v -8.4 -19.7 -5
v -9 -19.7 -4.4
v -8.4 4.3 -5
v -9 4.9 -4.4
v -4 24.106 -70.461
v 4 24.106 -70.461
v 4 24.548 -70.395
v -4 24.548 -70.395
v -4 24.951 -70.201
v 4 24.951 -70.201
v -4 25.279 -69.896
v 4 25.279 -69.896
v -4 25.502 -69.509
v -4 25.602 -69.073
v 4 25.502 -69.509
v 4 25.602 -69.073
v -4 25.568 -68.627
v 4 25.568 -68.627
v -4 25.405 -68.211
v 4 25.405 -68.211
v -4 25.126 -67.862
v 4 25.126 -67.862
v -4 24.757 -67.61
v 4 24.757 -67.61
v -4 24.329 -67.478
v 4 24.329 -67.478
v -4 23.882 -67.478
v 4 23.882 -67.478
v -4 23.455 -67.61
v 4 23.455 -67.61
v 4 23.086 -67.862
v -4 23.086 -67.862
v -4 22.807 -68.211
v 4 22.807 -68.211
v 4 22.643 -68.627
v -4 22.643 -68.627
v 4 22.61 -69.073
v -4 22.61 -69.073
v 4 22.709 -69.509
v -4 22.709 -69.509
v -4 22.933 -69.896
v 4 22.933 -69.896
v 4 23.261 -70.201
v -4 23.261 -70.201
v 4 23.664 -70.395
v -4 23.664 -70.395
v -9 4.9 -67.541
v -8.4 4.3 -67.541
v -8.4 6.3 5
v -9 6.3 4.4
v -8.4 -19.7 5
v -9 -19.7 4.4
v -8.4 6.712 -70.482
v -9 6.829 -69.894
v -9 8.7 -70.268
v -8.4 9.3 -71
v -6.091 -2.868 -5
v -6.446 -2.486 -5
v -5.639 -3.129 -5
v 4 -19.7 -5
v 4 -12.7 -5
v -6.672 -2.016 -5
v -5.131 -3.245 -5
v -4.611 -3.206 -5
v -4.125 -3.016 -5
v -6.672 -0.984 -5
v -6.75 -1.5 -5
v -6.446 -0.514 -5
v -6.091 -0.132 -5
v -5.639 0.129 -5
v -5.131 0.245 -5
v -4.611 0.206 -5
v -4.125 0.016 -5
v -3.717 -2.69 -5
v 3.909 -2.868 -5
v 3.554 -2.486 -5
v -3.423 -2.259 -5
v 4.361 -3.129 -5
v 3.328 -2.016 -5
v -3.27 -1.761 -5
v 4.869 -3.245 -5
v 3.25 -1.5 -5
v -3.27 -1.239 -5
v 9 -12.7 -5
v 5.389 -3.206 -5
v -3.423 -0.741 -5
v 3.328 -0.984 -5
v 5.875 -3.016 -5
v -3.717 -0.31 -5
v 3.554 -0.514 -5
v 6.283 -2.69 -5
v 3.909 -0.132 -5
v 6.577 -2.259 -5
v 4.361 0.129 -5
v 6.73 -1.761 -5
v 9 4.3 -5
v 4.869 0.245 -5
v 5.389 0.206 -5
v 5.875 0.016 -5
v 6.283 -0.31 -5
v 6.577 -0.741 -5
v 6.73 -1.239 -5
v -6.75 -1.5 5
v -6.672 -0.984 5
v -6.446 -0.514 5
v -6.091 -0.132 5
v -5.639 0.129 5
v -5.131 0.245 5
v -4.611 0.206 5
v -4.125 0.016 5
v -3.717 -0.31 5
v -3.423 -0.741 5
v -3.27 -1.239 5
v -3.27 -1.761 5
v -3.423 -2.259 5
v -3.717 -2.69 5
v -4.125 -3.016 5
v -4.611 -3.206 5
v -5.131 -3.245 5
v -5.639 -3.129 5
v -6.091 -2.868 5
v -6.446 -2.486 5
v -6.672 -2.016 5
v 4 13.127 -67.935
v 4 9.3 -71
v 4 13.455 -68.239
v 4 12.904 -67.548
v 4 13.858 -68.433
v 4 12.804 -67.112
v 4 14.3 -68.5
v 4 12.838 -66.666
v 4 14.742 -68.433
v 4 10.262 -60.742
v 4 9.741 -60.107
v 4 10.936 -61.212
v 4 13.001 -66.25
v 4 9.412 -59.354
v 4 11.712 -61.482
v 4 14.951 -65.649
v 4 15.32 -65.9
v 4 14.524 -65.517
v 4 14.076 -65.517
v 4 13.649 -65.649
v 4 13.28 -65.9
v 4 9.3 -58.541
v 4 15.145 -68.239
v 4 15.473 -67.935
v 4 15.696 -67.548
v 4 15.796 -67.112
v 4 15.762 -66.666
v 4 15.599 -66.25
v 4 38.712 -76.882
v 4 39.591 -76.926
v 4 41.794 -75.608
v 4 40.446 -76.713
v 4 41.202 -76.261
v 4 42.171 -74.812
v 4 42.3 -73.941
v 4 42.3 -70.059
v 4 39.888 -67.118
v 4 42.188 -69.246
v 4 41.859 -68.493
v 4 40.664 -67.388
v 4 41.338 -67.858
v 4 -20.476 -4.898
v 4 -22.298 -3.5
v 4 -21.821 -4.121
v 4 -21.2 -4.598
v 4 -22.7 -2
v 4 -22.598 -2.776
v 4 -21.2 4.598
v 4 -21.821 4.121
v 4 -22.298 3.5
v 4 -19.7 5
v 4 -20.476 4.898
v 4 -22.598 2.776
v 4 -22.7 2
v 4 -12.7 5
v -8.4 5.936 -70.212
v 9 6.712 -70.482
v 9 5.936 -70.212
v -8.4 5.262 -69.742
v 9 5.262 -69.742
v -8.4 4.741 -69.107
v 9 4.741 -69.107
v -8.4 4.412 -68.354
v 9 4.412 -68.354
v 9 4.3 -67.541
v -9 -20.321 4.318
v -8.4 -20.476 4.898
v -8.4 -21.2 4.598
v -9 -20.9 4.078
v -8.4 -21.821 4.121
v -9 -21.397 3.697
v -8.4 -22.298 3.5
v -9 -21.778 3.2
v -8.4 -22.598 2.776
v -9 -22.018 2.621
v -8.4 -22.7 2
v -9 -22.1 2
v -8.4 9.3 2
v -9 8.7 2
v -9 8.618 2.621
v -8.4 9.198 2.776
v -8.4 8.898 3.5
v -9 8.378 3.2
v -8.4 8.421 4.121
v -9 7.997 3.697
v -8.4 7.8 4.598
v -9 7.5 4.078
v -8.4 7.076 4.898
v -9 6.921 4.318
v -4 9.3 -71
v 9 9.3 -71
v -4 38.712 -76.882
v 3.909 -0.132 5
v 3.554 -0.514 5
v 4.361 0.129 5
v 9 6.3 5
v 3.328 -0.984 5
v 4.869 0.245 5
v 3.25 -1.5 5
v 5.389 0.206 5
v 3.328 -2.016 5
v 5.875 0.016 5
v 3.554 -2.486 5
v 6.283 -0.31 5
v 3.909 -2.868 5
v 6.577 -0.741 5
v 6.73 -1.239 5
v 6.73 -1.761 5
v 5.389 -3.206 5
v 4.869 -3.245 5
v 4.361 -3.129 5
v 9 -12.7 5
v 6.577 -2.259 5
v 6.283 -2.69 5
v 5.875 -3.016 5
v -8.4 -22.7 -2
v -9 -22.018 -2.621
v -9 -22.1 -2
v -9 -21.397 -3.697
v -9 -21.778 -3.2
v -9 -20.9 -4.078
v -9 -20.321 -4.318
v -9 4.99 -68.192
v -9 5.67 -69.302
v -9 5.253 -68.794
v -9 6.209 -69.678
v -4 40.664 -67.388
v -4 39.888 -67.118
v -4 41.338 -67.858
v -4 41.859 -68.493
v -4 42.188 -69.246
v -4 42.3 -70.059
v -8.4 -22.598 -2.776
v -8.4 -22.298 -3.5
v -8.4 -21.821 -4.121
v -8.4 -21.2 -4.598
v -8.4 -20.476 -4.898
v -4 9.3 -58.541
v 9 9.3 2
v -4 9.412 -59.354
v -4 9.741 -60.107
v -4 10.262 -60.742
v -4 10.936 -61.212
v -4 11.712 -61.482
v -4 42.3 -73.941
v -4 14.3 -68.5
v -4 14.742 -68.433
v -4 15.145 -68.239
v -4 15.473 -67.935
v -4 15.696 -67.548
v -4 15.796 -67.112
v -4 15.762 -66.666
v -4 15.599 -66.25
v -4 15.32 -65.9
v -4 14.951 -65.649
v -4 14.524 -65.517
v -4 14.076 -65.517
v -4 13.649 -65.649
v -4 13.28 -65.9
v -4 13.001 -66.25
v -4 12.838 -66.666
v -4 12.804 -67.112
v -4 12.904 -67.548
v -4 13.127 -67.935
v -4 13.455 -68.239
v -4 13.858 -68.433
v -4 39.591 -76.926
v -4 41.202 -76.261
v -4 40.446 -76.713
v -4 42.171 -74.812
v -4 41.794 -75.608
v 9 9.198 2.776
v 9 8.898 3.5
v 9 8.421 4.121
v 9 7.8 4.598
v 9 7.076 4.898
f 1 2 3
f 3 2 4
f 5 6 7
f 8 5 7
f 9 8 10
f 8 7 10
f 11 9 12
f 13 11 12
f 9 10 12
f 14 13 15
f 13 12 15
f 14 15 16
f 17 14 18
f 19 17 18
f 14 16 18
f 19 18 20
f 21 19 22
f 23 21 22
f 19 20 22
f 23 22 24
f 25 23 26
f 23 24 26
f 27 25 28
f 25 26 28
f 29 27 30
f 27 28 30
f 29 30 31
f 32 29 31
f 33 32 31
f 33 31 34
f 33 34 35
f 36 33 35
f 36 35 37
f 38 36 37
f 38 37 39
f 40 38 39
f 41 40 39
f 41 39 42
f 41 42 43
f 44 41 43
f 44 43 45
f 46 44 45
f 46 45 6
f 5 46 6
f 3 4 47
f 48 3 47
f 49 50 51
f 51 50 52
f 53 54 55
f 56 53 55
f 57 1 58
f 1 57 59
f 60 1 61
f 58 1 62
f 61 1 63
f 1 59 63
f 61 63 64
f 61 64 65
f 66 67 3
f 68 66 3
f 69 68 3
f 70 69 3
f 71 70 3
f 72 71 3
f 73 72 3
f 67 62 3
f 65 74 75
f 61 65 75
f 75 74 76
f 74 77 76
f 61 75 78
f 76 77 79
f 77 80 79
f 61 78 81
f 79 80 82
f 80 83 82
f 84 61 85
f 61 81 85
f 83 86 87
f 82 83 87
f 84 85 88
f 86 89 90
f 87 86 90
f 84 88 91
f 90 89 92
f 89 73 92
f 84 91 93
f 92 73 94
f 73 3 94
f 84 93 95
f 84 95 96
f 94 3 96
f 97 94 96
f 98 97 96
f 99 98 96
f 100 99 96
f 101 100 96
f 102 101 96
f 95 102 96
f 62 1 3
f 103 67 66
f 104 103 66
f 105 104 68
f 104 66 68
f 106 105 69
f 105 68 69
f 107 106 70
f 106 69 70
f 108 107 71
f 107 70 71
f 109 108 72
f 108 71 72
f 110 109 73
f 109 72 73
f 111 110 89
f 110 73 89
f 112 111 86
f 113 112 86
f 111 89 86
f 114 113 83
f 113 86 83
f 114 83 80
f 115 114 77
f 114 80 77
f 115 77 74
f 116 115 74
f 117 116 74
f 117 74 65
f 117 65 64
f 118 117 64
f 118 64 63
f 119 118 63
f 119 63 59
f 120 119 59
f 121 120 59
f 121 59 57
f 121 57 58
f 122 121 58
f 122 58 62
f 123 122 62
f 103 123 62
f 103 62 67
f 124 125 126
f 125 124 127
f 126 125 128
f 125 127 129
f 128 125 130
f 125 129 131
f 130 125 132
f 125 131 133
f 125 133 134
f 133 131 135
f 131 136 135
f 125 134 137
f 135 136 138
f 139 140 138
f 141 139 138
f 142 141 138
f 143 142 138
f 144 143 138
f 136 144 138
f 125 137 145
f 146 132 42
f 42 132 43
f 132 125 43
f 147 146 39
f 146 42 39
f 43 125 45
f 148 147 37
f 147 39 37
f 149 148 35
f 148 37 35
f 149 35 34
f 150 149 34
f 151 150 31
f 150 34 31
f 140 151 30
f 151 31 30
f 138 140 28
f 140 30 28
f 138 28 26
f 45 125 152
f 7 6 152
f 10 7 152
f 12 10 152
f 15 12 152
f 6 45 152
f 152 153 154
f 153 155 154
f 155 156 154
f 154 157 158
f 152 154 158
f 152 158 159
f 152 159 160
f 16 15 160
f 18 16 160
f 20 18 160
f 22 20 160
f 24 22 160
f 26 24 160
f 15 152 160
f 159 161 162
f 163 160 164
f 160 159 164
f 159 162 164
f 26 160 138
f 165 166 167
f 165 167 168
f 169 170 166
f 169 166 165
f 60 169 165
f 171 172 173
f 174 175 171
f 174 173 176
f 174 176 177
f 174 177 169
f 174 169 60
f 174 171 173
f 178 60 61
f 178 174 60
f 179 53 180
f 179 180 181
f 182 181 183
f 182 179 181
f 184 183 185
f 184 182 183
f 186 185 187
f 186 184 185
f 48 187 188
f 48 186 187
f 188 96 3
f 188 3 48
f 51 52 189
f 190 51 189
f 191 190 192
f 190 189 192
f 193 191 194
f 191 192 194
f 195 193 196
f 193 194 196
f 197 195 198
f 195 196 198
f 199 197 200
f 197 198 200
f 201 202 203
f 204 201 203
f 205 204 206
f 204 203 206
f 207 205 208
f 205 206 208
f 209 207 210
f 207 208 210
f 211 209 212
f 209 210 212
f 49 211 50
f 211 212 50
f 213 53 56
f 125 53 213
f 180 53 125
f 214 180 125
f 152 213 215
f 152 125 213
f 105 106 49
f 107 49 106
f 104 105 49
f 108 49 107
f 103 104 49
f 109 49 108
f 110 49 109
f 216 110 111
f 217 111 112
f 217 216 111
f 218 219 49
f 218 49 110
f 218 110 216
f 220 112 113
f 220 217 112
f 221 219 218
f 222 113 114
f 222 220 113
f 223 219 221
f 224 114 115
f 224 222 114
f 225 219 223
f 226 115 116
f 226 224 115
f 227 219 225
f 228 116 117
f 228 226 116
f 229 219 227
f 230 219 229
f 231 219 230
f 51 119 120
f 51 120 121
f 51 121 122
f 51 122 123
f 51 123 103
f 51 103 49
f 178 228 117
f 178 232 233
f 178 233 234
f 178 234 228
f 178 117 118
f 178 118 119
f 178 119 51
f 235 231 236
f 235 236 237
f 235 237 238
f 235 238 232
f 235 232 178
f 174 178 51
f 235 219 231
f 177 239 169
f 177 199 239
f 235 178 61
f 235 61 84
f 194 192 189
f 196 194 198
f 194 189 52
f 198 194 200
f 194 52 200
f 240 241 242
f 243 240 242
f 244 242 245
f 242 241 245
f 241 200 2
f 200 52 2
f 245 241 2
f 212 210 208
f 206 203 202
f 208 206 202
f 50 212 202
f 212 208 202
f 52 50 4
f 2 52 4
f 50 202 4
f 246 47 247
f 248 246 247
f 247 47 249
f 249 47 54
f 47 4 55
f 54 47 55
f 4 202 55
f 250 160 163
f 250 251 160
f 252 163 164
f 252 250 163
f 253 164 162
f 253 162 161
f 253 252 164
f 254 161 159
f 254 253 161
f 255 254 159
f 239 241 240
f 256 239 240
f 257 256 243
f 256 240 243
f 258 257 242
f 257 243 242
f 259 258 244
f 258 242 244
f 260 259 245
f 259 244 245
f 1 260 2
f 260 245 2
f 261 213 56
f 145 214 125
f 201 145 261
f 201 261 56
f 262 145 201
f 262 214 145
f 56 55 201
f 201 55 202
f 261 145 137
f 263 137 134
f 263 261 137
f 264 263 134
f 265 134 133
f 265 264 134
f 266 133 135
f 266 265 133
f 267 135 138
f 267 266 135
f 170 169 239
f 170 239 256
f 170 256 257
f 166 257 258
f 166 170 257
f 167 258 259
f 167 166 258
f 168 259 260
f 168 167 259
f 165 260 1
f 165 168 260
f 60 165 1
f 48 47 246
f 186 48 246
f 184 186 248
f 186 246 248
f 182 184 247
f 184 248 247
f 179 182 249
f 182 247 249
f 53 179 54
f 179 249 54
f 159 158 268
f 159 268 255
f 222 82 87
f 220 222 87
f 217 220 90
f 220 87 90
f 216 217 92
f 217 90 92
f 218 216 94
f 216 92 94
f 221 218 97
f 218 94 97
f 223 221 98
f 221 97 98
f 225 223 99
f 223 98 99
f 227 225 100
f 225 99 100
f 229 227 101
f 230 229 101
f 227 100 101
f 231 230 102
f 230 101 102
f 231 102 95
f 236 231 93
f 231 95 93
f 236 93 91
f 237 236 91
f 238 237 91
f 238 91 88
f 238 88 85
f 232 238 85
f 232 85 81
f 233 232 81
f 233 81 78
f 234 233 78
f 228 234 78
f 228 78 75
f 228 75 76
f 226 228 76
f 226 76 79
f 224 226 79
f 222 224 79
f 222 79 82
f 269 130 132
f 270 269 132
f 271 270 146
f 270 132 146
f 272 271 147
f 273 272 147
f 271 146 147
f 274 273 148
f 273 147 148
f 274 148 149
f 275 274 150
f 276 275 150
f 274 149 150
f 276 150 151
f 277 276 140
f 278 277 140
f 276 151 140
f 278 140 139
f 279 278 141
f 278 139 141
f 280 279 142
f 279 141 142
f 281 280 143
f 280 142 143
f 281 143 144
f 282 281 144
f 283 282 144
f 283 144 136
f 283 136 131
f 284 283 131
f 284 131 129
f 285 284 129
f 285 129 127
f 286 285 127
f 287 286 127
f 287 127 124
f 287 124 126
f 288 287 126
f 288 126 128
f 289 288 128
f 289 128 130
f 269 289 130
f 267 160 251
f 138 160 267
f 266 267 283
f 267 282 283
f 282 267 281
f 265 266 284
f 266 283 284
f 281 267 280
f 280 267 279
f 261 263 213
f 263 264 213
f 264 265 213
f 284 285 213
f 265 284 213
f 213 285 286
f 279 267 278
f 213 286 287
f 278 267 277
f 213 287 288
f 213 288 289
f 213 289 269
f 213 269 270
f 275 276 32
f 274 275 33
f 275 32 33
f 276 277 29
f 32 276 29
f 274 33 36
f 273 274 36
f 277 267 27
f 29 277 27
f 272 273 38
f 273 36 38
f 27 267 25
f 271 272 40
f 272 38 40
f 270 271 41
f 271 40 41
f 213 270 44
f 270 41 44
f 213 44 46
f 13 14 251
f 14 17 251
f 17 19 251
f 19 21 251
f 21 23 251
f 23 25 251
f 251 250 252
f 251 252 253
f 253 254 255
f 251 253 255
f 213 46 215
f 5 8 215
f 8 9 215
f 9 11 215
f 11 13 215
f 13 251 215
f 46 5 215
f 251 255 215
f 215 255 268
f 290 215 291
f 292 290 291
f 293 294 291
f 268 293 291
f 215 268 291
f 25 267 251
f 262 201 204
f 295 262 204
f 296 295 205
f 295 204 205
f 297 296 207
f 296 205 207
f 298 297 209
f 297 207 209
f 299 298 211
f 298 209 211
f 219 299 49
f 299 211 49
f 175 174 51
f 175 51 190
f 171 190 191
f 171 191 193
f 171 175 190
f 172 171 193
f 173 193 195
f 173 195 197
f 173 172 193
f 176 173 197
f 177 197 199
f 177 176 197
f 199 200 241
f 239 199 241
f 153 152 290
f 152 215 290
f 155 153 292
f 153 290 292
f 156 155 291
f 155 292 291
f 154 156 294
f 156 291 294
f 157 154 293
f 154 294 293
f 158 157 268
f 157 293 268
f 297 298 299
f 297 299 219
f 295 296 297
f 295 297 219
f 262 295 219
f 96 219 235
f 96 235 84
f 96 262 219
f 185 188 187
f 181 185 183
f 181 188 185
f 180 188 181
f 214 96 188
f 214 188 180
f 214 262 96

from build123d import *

# Parameters (mm, degrees)
EXTRUDE_1_DEPTH     = 9
CUT_EXTRUDE_1_DEPTH = 5
SKETCH_3_R          = 1.75
CUT_EXTRUDE_2_DEPTH = 50.647599136312735
SKETCH_4_W          = 3.000000000000001
SKETCH_4_H          = 19.851507449534697
EXTRUDE_2_DEPTH     = 5.5
FILLET_2_R          = 5
FILLET_3_R          = 5
SKETCH_6_W          = 18
SKETCH_6_H          = 10.000000000000004
EXTRUDE_3_DEPTH     = 16.2
CUT_EXTRUDE_5_DEPTH = 52.567649463300064
CUT_EXTRUDE_6_DEPTH = 53.49411618001278
EXTRUDE_4_DEPTH     = 18
SKETCH_11_W         = 4.999999999999995
SKETCH_11_H         = 18.60004044786868
CUT_EXTRUDE_7_DEPTH = 33
SKETCH_12_R         = 1.4999999999999973
CUT_EXTRUDE_8_DEPTH = 90.33116605445798
FILLET_4_R          = 3
CHAMFER_3_SIZE      = 0.6


# Some blends are built 0.0001 mm under size
with BuildPart() as part:
    # ｽｹｯﾁ1 → ﾎﾞｽ - 押し出し1 (new, symmetric)
    with BuildSketch(Plane(origin=(0, 0, 0), x_dir=(0, 0, -1), z_dir=(1, 0, 0))):
        Polygon((-5.0000000000000036, -6.499999999999999), (5.0000000000000036, -6.499999999999999), (5.0000000000000036, 6.499999999999999), (13.25805060886326, 47.79), (3.2580506088632593, 47.79), (-5.0000000000000036, 6.500000000000001), align=None)
    extrude(amount=EXTRUDE_1_DEPTH, both=True)

    # ｽｹｯﾁ2 → ｶｯﾄ - 押し出し1 (cut)
    with BuildSketch(Plane(origin=(9, 0, 0), x_dir=(0, 0, -1), z_dir=(1, 0, 0))):
        Polygon((3.2580506088632593, 47.790000000000006), (-1.10677614066039, 25.966000000000005), (8.50860394182422, 24.04291219799919), (13.258050608863256, 47.790000000000006), align=None)
    cut_extrude_1 = extrude(amount=-CUT_EXTRUDE_1_DEPTH, mode=Mode.SUBTRACT)

    # ﾐﾗｰ1: ｶｯﾄ - 押し出し1 across plane
    add(cut_extrude_1.mirror(Plane(origin=(0, 0, 0), x_dir=(0, 0, 1), z_dir=(1, 0, 0))), mode=Mode.SUBTRACT)

    # ｽｹｯﾁ3 → ｶｯﾄ - 押し出し2 (cut, through all)
    with BuildSketch(Plane(origin=(0, 0, -5.0000000000000036), x_dir=(-1, 0, 0), z_dir=(0, 0, -1))):
        with Locations((5, -1.4999999999999987)):
            Circle(SKETCH_3_R)
        with Locations((-5, -1.4999999999999987)):
            Circle(SKETCH_3_R)
    extrude(amount=-CUT_EXTRUDE_2_DEPTH, mode=Mode.SUBTRACT)

    # ｽｹｯﾁ4 → ﾎﾞｽ - 押し出し2 (add)
    with BuildSketch(Plane(origin=(0, 1.2115468473854123, 6.057697112542844), x_dir=(1, 0, 0), z_dir=(0, 0.19611729080206414, 0.980580444557436))):
        with Locations((7.5, 15.318940160380402)):
            Rectangle(SKETCH_4_W, SKETCH_4_H)
        Polygon((-8.99999999999999, 5.393186435613051), (-8.999999999999993, 25.24469388514775), (-5.999999999999994, 25.244693885147754), (-5.9999999999999885, 5.393186435613052), align=None)
    extrude(amount=EXTRUDE_2_DEPTH)

    # ﾌｨﾚｯﾄ2
    # the kernel refuses this fillet: 5 mm, written as the material it takes off along each edge
    with BuildSketch(Plane(origin=(-19.247567109880233, 47.79, -13.25805060886326), x_dir=(0, -0.9805804445574373, 0.19611729080205748), z_dir=(1, 0, 0))) as fillet_2_piece_1:
        with BuildLine():
            CenterArc((FILLET_2_R * 1.21980536879, -FILLET_2_R), FILLET_2_R, 90.00000000000003, 101.30999999999938)
            Line((FILLET_2_R * 0.239224924233, -FILLET_2_R * 1.1961172908), (0, 0))
            Line((0, 0), (FILLET_2_R * 1.21980536879, 2e-17))
        make_face()
    extrude(amount=38.495134219760466, mode=Mode.SUBTRACT)
    with BuildSketch(Plane(origin=(14.247536467555662, 47.79, -3.2580506088632593), x_dir=(0, 0, -1), z_dir=(-1, 0, 0))) as fillet_2_piece_2:
        with BuildLine():
            CenterArc((FILLET_2_R * 0.819802917404, FILLET_2_R), FILLET_2_R, 191.30999999999946, 78.69000000000051)
            Line((-FILLET_2_R * 0.160777527153, FILLET_2_R * 0.803882709198), (0, 0))
            Line((0, 0), (FILLET_2_R * 0.819802917404, 0))
        make_face()
    extrude(amount=28.495072935111324, mode=Mode.SUBTRACT)

    # ﾌｨﾚｯﾄ3
    fillet_3_edges = [part.edges().sort_by_distance(p)[0] for p in [
        (-4, 25.004456098999597, -3.7009139005819147),
        (4, 25.004456098999597, -3.7009139005819147),
    ]]
    fillet(fillet_3_edges, radius=FILLET_3_R - 0.0001)  # a hair under: the kernel refuses the full size

    # 面取り2
    # the kernel refuses this chamfer: 1 mm, written as the material it takes off along each edge
    with BuildSketch(Plane(origin=(9, 23.43957972269821, -11.525247830932894), x_dir=(-0.9850292351397439, 0.16903968557305887, -0.0338081443053687), z_dir=(0, 0.19611729080206025, 0.9805804445574368))) as chamfer_2_piece_1:
        with BuildLine():
            Line((1.2305543745450382, 1e-17), (-0.4179125111005865, 1.157416606835036))
            Line((-0.4179125111005865, 1.157416606835036), (-0.5656668963715484, 1.1315585010807419))
            ThreePointArc((-0.5656668963715484, 1.1315585010807419), (-0.2522325130461084, 0.5711346395907222), (-0.14775438527096194, -0.02585810575429407))
            Line((-0.14775438527096194, -0.02585810575429407), (0.02585810575429378, -0.14775438527096027))
            ThreePointArc((0.02585810575429378, -0.14775438527096027), (0.6228508510993123, -0.04327625749581342), (1.2564124802993322, -0.14775438527096027))
            Line((1.2564124802993322, -0.14775438527096027), (1.2305543745450382, 1e-17))
        make_face()
    extrude(amount=21.458576318299393, mode=Mode.SUBTRACT)

    # ｽｹｯﾁ6 → ﾎﾞｽ - 押し出し3 (add)
    with BuildSketch(Plane.XZ.offset(6.499999999999999)):
        Rectangle(SKETCH_6_W, SKETCH_6_H)
    extrude(amount=EXTRUDE_3_DEPTH)

    # ｽｹｯﾁ7 → ｶｯﾄ - 押し出し5 (cut, through all)
    with BuildSketch(Plane.XY.offset(5.0000000000000036)):
        Polygon((9, -22.7), (3.9999999999999982, -22.7), (3.9999999999999982, -12.700000000000001), (9, -12.7), align=None)
    extrude(amount=-CUT_EXTRUDE_5_DEPTH, mode=Mode.SUBTRACT)

    # ｽｹｯﾁ8 → ｶｯﾄ - 押し出し6 (cut, through all)
    with BuildSketch(Plane(origin=(9, 0, 0), x_dir=(0, 0, -1), z_dir=(1, 0, 0))):
        Polygon((-14.730367070472871, 56.5), (-14.730367070472871, 6.499999999999999), (-5.0000000000000036, 6.499999999999999), (-10.393192445065868, 7.578645099411347), (-6.696085876528205, 26.064064654853848), (8.31248665102216, 23.062331753441747), (5.0000000000000036, 6.499999999999999), (15.269632929527129, 6.499999999999999), (15.269632929527127, 56.5), align=None)
        Polygon((-10.393192445065868, 7.578645099411347), (-5.0000000000000036, 6.500000000000001), (5.000000000000002, 6.499999999999999), (8.31248665102216, 23.062331753441747), (-6.696085876528205, 26.064064654853848), align=None)
    extrude(amount=-CUT_EXTRUDE_6_DEPTH, mode=Mode.SUBTRACT)

    # ｽｹｯﾁ10 → ﾎﾞｽ - 押し出し4 (add)
    with BuildSketch(Plane(origin=(9, 0, 0), x_dir=(0, 0, -1), z_dir=(1, 0, 0))):
        Polygon((61.000006128464946, 9.300000000000002), (-5.0000000000000036, 9.300000000000002), (-5.0000000000000036, 6.499999999999999), (5.000000000000002, 6.499999999999999), (5.0000000000000036, 4.299999999999994), (69.99999999999999, 4.300000000000002), (77.60004657633361, 42.300000000000004), (67.60004657633361, 42.3), align=None)
    extrude(amount=-EXTRUDE_4_DEPTH)

    # ｽｹｯﾁ11 → ｶｯﾄ - 押し出し7 (cut)
    with BuildSketch(Plane(origin=(0, 42.29999999999995, 2.935e-14), x_dir=(1, 0, 0), z_dir=(0, 1, 0))):
        with Locations((-6.499999999999997, 68.30002635239924)):
            Rectangle(SKETCH_11_W, SKETCH_11_H)
        Polygon((4, 77.60004657633358), (4, 59.0000061284649), (8.999999999999995, 59.0000061284649), (9, 77.60004657633358), align=None)
    extrude(amount=-CUT_EXTRUDE_7_DEPTH, mode=Mode.SUBTRACT)

    # ｽｹｯﾁ12 → ｶｯﾄ - 押し出し8 (cut, through all)
    with BuildSketch(Plane(origin=(4, 0, 0), x_dir=(-5e-17, 0, -1), z_dir=(1, 0, -5e-17))):
        with Locations((68.96118516495055, 24.105804445574364)):
            Circle(SKETCH_12_R)
        with Locations((67.00001225692989, 14.300000000000004)):
            Circle(SKETCH_12_R)
    extrude(amount=-CUT_EXTRUDE_8_DEPTH, mode=Mode.SUBTRACT)

    # ﾌｨﾚｯﾄ4
    fillet_4_edges = [part.edges().sort_by_distance(p)[0] for p in [
        (-2.500000000000001, -22.7, -5.000000000000002),
        (-2.5, -22.7, 5.000000000000002),
        (0, 9.300000000000002, 5.0000000000000036),
        (0, 4.3000000000000025, -69.99999999999999),
        (0, 42.300000000000004, -77.60004657633361),
        (0, 42.3, -67.60004657633361),
        (0, 9.300000000000002, -61.000006128464946),
    ]]
    fillet(fillet_4_edges, radius=FILLET_4_R)

    # 面取り3
    chamfer_3_edges = [part.edges().sort_by_distance(p)[0] for p in [
        (-8.999999999999998, 9.299999999999974, -34.50000306423246),
        (-9, 4.299999999999998, -36.27029562389333),
        (-9, -22.7, 0),
        (-9, 8.005824063796883, -70.74116935496194),
        (-9, -7.700000000000004, -5.000000000000003),
        (-9, -6.699999999999992, 5.000000000000003),
        (-9, 8.421320343559644, 4.1213203435596455),
        (-9, 4.979972455204619, -69.4425565974686),
        (-9, -21.821320343559645, -4.1213203435596455),
        (-9, -21.82132034355964, 4.1213203435596455),
    ]]
    chamfer(chamfer_3_edges, length=CHAMFER_3_SIZE)


solid = part.part
